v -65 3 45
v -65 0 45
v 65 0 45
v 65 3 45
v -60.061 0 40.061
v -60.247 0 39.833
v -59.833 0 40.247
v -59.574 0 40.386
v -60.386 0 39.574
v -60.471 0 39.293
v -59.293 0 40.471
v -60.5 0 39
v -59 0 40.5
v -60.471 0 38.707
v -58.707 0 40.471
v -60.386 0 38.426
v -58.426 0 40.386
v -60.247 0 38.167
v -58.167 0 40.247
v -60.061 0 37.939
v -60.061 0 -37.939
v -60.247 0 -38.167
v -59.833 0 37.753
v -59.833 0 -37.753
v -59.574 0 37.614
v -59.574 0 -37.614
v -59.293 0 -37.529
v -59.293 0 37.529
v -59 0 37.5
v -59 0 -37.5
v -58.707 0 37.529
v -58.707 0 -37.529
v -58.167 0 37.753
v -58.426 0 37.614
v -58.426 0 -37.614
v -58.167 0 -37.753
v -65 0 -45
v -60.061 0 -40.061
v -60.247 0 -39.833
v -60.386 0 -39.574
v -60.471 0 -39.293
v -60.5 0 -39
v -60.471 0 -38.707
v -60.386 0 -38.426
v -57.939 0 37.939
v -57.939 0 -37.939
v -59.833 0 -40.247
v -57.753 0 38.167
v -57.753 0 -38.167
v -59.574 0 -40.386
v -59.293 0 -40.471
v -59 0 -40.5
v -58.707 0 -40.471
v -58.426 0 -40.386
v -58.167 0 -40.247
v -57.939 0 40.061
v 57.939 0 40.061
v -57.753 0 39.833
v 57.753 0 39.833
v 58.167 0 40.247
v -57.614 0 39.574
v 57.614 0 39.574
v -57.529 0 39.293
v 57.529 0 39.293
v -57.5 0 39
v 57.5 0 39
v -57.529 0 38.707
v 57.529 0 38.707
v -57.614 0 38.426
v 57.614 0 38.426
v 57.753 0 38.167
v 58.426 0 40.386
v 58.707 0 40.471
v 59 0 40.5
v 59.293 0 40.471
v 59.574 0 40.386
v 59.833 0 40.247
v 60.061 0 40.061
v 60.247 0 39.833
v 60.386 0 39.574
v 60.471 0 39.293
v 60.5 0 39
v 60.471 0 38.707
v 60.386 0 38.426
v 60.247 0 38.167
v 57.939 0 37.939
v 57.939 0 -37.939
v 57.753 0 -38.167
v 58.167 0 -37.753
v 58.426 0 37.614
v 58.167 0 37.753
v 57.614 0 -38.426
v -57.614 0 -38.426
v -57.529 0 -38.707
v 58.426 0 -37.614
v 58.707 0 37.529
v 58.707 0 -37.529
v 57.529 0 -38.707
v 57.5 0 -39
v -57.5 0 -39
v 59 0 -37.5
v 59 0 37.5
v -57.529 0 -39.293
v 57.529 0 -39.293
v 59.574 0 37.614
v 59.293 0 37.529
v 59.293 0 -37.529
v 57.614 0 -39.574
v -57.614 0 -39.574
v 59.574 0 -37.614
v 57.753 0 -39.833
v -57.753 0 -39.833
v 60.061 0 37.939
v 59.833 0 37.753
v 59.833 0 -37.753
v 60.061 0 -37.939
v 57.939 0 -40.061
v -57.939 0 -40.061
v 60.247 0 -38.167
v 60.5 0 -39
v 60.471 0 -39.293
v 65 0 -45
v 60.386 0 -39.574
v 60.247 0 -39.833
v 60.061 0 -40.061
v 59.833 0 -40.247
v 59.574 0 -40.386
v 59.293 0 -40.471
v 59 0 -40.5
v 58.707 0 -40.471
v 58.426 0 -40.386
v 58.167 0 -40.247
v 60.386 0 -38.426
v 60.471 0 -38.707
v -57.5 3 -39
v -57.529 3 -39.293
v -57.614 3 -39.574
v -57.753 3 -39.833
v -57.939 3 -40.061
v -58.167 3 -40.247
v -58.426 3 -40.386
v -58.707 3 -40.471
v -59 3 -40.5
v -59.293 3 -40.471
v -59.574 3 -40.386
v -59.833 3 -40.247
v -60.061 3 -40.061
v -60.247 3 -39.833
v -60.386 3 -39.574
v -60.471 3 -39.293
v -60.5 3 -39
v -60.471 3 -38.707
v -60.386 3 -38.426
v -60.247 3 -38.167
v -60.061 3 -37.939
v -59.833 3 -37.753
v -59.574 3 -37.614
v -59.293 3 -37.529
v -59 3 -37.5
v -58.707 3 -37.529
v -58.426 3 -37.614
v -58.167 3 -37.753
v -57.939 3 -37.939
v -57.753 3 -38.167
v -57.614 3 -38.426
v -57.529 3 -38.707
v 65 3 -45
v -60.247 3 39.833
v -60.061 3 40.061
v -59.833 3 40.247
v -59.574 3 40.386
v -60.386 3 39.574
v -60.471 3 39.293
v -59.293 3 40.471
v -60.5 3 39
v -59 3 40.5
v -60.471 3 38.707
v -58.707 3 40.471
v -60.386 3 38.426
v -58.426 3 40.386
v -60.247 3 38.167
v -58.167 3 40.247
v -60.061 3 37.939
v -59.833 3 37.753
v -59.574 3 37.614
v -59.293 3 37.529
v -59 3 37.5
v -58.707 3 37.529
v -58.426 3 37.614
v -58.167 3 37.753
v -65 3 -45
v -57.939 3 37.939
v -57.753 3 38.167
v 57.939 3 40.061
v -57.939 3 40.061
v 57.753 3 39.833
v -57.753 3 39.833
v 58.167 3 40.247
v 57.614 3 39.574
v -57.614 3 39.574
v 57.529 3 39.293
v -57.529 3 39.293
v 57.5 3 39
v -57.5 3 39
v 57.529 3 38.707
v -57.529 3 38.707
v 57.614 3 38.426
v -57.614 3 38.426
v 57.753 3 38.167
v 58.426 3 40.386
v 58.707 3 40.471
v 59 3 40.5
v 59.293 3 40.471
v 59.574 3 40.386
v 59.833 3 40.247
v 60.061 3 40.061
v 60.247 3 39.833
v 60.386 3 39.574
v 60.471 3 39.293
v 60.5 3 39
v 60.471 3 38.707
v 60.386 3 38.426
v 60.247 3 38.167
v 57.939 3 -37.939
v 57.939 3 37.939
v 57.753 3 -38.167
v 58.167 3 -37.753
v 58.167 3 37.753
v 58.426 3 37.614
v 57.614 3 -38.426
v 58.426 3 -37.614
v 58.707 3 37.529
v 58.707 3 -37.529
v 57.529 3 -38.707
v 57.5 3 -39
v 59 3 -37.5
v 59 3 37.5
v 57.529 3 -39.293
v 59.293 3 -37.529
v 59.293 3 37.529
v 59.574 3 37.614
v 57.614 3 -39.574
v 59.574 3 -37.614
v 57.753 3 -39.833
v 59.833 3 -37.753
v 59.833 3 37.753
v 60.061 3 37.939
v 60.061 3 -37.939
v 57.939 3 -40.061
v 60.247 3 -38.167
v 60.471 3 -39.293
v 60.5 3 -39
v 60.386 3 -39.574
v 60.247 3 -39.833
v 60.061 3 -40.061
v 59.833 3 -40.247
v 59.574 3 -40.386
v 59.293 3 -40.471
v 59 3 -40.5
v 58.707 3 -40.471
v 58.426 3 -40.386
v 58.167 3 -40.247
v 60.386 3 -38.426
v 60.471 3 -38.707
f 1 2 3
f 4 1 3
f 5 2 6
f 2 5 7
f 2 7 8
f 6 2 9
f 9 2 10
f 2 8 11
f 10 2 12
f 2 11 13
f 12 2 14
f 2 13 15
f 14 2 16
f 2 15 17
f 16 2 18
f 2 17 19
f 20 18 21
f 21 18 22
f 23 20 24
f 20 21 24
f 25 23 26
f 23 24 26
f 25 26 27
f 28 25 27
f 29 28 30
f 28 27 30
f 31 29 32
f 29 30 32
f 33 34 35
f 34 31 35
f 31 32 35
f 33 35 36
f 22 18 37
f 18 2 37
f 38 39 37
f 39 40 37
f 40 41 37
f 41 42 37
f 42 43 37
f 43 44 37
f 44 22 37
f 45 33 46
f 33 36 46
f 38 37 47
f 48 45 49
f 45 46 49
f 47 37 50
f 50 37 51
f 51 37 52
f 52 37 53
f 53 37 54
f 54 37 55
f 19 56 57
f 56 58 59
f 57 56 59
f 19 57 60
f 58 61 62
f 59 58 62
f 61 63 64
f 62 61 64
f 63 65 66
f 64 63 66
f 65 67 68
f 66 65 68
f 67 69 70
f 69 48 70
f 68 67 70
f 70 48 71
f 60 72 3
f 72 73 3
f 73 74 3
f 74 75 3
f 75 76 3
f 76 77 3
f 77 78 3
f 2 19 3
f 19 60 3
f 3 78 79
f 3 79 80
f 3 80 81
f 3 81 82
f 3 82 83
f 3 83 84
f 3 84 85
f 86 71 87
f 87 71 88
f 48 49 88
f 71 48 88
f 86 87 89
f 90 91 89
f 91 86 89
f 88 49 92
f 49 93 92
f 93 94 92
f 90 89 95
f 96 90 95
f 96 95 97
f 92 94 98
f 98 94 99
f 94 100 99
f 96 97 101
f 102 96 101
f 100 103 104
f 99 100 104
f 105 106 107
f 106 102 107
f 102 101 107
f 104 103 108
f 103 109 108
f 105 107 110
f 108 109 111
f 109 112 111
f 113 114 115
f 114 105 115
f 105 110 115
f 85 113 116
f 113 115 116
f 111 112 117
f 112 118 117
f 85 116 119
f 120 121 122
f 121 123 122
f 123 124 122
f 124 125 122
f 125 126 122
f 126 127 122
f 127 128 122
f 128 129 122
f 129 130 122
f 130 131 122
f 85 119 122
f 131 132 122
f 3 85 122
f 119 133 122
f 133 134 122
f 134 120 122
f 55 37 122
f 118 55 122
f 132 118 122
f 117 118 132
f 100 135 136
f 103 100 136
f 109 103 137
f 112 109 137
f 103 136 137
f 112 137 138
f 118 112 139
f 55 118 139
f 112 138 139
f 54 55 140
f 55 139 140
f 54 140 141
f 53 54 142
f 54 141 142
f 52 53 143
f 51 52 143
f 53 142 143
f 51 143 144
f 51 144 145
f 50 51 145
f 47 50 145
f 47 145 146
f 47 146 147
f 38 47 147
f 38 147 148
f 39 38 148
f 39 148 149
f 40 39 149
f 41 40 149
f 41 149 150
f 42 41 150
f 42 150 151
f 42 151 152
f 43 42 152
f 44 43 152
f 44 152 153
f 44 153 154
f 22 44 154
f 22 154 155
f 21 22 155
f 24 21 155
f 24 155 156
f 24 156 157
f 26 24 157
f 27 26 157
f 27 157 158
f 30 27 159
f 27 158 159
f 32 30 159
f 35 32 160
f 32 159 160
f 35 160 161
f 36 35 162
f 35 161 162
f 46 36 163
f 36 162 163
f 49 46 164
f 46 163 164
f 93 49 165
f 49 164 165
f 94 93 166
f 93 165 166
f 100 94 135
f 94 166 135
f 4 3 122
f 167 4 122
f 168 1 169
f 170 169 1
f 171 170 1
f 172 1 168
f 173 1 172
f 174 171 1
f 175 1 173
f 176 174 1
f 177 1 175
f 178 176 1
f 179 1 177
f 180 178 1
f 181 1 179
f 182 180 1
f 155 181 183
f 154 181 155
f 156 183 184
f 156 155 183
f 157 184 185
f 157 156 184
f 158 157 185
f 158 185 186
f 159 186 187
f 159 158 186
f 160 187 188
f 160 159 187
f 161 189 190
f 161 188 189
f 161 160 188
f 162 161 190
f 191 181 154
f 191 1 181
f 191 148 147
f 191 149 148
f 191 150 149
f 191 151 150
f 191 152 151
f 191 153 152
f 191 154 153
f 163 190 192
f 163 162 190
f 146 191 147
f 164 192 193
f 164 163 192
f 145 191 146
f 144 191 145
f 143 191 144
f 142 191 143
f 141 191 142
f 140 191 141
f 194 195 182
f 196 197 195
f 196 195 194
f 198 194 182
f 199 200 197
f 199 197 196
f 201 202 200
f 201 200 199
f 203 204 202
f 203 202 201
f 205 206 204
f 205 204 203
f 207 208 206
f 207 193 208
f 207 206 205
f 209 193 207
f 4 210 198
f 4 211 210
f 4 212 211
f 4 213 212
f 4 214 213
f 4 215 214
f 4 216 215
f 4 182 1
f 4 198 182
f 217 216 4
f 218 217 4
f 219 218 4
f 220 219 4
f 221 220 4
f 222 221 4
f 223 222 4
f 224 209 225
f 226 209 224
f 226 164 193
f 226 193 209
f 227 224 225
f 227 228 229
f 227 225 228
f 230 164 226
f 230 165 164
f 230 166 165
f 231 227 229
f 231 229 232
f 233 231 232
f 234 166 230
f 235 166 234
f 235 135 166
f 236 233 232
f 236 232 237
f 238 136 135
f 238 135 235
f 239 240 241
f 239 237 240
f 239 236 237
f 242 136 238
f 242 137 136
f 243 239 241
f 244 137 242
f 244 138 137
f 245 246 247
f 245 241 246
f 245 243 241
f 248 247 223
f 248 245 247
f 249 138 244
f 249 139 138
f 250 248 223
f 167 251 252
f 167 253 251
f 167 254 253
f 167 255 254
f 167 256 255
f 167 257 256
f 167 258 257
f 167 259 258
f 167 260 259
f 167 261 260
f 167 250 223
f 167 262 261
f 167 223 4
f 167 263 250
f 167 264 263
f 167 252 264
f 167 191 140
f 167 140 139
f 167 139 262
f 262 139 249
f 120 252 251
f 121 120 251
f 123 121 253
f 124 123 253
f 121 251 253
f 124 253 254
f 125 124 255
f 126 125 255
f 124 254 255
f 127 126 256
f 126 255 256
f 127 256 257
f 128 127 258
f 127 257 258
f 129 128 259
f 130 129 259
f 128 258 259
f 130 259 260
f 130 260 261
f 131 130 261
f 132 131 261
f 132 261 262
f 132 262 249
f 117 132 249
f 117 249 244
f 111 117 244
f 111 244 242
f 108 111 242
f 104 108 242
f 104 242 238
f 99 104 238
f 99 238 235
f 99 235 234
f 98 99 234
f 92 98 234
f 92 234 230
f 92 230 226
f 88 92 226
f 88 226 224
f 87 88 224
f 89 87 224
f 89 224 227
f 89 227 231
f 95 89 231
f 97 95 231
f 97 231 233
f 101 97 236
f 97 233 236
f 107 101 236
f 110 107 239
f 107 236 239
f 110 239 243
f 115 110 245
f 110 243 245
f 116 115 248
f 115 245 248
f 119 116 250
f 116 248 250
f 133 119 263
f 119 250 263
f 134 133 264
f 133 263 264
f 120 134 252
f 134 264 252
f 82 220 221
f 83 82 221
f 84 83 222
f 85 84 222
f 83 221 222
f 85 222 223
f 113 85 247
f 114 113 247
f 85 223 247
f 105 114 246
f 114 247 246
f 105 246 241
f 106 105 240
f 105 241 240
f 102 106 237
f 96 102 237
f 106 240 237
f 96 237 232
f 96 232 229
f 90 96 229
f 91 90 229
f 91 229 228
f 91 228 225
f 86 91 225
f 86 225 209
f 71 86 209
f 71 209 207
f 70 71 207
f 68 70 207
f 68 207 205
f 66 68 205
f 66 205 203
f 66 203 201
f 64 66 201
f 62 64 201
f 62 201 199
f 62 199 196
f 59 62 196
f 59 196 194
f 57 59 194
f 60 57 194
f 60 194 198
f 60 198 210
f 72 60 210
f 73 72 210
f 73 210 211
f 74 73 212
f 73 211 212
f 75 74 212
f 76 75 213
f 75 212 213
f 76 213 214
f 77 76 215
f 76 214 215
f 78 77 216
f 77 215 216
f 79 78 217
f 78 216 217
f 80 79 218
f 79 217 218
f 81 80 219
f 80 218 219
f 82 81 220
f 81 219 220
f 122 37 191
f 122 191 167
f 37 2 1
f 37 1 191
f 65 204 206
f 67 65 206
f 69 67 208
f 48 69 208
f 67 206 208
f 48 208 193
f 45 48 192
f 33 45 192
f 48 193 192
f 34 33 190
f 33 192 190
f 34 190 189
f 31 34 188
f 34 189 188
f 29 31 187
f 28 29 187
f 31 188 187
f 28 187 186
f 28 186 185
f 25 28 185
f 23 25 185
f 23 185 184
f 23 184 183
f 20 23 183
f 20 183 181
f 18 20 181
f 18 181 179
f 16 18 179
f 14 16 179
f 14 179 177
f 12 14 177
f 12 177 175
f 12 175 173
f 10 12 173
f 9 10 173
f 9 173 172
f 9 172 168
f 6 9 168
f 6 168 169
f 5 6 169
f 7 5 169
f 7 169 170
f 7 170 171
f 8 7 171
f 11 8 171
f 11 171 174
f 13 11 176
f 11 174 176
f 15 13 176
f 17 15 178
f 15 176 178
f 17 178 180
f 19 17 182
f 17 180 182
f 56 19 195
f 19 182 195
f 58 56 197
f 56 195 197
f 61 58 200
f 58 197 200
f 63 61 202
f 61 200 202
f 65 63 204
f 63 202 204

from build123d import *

# Parameters (mm, degrees)
SKETCH2_W            = 130
SKETCH2_H            = 90
BOSS_EXTRUDE1_DEPTH  = 3
SKETCH3_R            = 1.5
CUT_EXTRUDE1_DEPTH   = 4
LPATTERN1_COUNT      = 2
LPATTERN1_PITCH      = 78
LPATTERN1_COUNT_DIR2 = 2
LPATTERN1_PITCH_DIR2 = 118


with BuildPart() as part:
    # Sketch2 → Boss-Extrude1 (new body)
    with BuildSketch(Plane(origin=(0, 0, 0), x_dir=(1, 0, 0), z_dir=(0, 1, 0))):
        Rectangle(SKETCH2_W, SKETCH2_H)
    extrude(amount=BOSS_EXTRUDE1_DEPTH)

    # Sketch3 → Cut-Extrude1 (cut, through all)
    with BuildSketch(Plane(origin=(0, 3, 0), x_dir=(1, 0, 0), z_dir=(0, 1, 0))):
        with Locations((59, -39)):
            Circle(SKETCH3_R)
    cut_extrude1 = extrude(amount=-CUT_EXTRUDE1_DEPTH, mode=Mode.SUBTRACT)

    # LPattern1: Cut-Extrude1 2 × 2
    with Locations(*[(-j * LPATTERN1_PITCH_DIR2, 0, -i * LPATTERN1_PITCH) for i in range(LPATTERN1_COUNT) for j in range(LPATTERN1_COUNT_DIR2) if (i, j) != (0, 0)]):
        add(cut_extrude1, mode=Mode.SUBTRACT)


solid = part.part
